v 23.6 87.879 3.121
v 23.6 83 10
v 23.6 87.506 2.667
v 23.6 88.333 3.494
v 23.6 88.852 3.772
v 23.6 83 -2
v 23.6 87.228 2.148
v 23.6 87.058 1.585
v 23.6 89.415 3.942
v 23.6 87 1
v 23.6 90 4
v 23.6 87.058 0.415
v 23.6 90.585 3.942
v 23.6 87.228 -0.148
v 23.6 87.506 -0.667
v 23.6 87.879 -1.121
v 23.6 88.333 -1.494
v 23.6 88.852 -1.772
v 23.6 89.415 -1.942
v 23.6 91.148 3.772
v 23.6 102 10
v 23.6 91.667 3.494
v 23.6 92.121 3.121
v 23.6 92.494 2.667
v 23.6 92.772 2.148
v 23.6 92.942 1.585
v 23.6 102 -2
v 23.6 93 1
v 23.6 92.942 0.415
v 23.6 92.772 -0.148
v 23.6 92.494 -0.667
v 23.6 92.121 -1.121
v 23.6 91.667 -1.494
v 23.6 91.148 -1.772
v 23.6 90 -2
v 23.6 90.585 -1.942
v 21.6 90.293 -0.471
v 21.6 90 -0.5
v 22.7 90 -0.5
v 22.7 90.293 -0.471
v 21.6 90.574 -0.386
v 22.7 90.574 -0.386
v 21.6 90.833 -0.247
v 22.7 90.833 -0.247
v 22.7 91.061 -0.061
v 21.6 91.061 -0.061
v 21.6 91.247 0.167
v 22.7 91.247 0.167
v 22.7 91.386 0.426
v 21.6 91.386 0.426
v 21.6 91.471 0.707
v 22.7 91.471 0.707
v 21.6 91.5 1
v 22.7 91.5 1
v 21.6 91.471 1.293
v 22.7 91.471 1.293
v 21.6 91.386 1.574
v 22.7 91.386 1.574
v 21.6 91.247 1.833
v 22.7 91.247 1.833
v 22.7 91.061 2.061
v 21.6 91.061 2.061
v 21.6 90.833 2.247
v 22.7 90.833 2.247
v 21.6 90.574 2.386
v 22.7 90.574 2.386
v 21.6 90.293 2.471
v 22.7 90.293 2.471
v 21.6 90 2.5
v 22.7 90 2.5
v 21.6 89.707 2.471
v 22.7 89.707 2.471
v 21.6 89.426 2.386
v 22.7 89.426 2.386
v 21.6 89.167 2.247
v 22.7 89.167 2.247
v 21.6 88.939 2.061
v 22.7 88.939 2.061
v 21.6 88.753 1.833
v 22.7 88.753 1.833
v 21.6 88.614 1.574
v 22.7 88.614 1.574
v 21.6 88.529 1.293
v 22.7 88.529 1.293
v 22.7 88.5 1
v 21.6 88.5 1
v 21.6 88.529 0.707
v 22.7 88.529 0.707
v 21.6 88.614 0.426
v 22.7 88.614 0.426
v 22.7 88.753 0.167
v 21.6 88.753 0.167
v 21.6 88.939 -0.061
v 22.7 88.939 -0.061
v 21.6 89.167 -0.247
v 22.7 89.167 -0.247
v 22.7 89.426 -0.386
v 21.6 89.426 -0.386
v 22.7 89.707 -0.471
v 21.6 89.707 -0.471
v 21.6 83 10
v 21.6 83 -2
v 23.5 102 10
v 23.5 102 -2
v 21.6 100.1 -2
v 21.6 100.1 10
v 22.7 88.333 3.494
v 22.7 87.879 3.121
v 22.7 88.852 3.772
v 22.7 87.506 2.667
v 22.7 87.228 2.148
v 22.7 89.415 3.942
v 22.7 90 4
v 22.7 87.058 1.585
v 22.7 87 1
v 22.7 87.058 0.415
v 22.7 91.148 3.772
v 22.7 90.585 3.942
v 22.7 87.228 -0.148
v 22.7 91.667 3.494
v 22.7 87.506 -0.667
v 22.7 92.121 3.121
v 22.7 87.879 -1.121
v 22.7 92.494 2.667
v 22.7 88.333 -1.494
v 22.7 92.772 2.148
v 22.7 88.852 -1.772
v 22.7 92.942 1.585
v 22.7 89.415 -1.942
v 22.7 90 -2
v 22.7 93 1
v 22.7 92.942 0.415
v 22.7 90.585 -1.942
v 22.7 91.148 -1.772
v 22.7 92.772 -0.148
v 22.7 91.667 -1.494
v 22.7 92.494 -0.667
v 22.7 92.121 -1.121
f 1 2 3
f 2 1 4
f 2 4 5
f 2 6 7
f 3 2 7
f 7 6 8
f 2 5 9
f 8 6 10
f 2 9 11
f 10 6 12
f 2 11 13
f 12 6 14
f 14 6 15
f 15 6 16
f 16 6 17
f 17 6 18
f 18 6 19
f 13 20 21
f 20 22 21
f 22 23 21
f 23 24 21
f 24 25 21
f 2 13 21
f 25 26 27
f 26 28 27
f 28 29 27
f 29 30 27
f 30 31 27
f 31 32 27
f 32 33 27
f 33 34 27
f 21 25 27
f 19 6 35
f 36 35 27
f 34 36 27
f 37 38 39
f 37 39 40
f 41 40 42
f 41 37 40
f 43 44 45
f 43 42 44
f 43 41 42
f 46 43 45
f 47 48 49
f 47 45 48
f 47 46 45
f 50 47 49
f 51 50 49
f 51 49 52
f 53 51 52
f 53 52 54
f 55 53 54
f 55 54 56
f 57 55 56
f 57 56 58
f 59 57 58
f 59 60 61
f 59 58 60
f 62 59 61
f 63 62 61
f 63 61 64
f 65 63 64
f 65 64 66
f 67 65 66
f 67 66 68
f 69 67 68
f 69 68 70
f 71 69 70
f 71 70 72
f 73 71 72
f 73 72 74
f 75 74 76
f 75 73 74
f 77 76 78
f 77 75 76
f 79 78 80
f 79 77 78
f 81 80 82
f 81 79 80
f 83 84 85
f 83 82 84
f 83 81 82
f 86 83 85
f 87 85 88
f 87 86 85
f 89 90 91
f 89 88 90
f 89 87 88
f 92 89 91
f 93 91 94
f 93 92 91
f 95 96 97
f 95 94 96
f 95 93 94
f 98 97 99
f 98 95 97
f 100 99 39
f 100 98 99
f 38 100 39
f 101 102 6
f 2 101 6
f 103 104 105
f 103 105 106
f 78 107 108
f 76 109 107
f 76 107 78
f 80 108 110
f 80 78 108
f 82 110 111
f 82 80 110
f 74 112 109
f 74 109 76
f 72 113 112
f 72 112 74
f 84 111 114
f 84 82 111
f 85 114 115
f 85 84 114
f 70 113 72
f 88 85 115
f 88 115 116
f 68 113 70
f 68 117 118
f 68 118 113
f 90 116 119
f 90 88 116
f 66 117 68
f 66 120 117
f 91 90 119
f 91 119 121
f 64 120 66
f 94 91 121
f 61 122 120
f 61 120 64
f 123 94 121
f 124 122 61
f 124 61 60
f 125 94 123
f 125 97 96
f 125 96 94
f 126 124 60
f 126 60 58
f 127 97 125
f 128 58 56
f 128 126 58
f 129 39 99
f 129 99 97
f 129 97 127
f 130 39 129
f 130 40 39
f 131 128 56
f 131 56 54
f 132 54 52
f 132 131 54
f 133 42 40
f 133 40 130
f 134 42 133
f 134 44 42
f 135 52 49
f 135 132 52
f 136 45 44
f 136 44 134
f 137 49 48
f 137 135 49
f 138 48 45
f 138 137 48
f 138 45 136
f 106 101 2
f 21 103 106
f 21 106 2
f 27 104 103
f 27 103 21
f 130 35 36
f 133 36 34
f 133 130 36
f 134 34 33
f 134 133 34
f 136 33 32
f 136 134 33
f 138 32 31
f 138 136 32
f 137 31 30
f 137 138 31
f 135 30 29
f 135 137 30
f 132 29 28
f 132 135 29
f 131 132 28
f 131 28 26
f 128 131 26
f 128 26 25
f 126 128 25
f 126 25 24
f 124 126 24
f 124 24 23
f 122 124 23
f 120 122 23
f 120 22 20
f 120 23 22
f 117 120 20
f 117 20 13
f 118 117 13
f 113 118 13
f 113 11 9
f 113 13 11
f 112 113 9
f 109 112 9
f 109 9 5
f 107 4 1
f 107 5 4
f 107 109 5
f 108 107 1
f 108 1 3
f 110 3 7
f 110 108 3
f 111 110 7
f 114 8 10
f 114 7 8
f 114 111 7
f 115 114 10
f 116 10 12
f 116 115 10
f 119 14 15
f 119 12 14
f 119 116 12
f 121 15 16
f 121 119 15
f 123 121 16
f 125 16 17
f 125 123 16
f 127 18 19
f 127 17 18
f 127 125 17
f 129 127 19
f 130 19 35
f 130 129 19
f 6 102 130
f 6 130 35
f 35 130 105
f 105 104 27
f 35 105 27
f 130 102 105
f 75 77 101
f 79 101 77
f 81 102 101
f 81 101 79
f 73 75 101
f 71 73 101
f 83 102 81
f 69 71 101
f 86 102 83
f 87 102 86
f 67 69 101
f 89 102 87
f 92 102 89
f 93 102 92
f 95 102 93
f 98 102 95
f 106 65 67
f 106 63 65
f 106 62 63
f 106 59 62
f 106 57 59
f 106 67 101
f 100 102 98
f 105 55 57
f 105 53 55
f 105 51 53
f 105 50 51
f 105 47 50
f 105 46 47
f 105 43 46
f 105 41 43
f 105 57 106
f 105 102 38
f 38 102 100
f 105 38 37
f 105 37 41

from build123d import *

# Parameters (mm, degrees)
CYLINDER3124_R               = 3
CYLINDER3124_DEPTH           = 3
COMPOUND1375_PLACEMENT_ANGLE = 90
CYLINDER3123_R               = 1.5
CYLINDER3123_DEPTH           = 12
CYLINDER3126_R               = 1.5
CYLINDER3126_DEPTH           = 4
BOX1133_W                    = 6
BOX1133_H                    = 6
BOX1133_DEPTH                = 2
COMPOUND1373_PLACEMENT_ANGLE = 90
BOX1134_W                    = 2
BOX1134_H                    = 19
BOX1134_DEPTH                = 12
CHAMFER182_SIZE              = 1.9


with BuildPart() as compound1375:
    # Cylinder3124 → Cylinder3124 (new body)
    with BuildSketch(Plane(origin=(1, 14, 6), x_dir=(1, 0, 0), z_dir=(0, 0, 1))):
        Circle(CYLINDER3124_R)
    extrude(amount=CYLINDER3124_DEPTH)


with BuildPart() as compound1375_1:
    # Compound1375 placement: moved
    add(compound1375.part.moved(Location((16.5, 73, 2))).rotate(Axis((16.5, 73, 2), (0, 1, 0)), COMPOUND1375_PLACEMENT_ANGLE))


with BuildPart() as v_lec3093:
    # Cylinder3123 → Cylinder3123 (new body)
    with BuildSketch(Plane(origin=(1, 14, 6), x_dir=(1, 0, 0), z_dir=(0, 0, 1))):
        Circle(CYLINDER3123_R)
    extrude(amount=CYLINDER3123_DEPTH)


with BuildPart() as v_lec3096:
    # Cylinder3126 → Cylinder3126 (new body)
    with BuildSketch(Plane(origin=(1, 14, -0.1), x_dir=(1, 0, 0), z_dir=(0, 0, 1))):
        Circle(CYLINDER3126_R)
    extrude(amount=CYLINDER3126_DEPTH)


with BuildPart() as compound1373:
    # Box1133 → Box1133 (new body)
    with BuildSketch(Plane(origin=(-2, 11, 4), x_dir=(1, 0, 0), z_dir=(0, 0, 1))):
        with Locations((3, 3)):
            Rectangle(BOX1133_W, BOX1133_H)
    extrude(amount=BOX1133_DEPTH)

    # Compound1373: union Válec3093, Válec3096
    add(v_lec3093.part)
    add(v_lec3096.part)


with BuildPart() as compound1373_1:
    # Compound1373 placement: moved
    add(compound1373.part.moved(Location((6, 73, 2))).rotate(Axis((6, 73, 2), (0, 1, 0)), COMPOUND1373_PLACEMENT_ANGLE))


with BuildPart() as chamfer182:
    # Box1134 → Box1134 (new body)
    with BuildSketch(Plane(origin=(21.4, 80, -2), x_dir=(1, 0, 0), z_dir=(0, 0, 1))):
        with Locations((1, 9.5)):
            Rectangle(BOX1134_W, BOX1134_H)
    extrude(amount=BOX1134_DEPTH)

    # Cut1268: cut Compound1373
    add(compound1373_1.part, mode=Mode.SUBTRACT)

    # Cut1269: cut Compound1375
    add(compound1375_1.part, mode=Mode.SUBTRACT)

    # Chamfer182
    chamfer182_edges = [chamfer182.edges().sort_by_distance(p)[0] for p in [
        (21.4, 99, 4),
    ]]
    chamfer(chamfer182_edges, length=CHAMFER182_SIZE)


with BuildPart() as chamfer182_1:
    # Chamfer182 placement: moved
    add(chamfer182.part.moved(Location((0.2, 3, 0))))


solid = chamfer182_1.part
